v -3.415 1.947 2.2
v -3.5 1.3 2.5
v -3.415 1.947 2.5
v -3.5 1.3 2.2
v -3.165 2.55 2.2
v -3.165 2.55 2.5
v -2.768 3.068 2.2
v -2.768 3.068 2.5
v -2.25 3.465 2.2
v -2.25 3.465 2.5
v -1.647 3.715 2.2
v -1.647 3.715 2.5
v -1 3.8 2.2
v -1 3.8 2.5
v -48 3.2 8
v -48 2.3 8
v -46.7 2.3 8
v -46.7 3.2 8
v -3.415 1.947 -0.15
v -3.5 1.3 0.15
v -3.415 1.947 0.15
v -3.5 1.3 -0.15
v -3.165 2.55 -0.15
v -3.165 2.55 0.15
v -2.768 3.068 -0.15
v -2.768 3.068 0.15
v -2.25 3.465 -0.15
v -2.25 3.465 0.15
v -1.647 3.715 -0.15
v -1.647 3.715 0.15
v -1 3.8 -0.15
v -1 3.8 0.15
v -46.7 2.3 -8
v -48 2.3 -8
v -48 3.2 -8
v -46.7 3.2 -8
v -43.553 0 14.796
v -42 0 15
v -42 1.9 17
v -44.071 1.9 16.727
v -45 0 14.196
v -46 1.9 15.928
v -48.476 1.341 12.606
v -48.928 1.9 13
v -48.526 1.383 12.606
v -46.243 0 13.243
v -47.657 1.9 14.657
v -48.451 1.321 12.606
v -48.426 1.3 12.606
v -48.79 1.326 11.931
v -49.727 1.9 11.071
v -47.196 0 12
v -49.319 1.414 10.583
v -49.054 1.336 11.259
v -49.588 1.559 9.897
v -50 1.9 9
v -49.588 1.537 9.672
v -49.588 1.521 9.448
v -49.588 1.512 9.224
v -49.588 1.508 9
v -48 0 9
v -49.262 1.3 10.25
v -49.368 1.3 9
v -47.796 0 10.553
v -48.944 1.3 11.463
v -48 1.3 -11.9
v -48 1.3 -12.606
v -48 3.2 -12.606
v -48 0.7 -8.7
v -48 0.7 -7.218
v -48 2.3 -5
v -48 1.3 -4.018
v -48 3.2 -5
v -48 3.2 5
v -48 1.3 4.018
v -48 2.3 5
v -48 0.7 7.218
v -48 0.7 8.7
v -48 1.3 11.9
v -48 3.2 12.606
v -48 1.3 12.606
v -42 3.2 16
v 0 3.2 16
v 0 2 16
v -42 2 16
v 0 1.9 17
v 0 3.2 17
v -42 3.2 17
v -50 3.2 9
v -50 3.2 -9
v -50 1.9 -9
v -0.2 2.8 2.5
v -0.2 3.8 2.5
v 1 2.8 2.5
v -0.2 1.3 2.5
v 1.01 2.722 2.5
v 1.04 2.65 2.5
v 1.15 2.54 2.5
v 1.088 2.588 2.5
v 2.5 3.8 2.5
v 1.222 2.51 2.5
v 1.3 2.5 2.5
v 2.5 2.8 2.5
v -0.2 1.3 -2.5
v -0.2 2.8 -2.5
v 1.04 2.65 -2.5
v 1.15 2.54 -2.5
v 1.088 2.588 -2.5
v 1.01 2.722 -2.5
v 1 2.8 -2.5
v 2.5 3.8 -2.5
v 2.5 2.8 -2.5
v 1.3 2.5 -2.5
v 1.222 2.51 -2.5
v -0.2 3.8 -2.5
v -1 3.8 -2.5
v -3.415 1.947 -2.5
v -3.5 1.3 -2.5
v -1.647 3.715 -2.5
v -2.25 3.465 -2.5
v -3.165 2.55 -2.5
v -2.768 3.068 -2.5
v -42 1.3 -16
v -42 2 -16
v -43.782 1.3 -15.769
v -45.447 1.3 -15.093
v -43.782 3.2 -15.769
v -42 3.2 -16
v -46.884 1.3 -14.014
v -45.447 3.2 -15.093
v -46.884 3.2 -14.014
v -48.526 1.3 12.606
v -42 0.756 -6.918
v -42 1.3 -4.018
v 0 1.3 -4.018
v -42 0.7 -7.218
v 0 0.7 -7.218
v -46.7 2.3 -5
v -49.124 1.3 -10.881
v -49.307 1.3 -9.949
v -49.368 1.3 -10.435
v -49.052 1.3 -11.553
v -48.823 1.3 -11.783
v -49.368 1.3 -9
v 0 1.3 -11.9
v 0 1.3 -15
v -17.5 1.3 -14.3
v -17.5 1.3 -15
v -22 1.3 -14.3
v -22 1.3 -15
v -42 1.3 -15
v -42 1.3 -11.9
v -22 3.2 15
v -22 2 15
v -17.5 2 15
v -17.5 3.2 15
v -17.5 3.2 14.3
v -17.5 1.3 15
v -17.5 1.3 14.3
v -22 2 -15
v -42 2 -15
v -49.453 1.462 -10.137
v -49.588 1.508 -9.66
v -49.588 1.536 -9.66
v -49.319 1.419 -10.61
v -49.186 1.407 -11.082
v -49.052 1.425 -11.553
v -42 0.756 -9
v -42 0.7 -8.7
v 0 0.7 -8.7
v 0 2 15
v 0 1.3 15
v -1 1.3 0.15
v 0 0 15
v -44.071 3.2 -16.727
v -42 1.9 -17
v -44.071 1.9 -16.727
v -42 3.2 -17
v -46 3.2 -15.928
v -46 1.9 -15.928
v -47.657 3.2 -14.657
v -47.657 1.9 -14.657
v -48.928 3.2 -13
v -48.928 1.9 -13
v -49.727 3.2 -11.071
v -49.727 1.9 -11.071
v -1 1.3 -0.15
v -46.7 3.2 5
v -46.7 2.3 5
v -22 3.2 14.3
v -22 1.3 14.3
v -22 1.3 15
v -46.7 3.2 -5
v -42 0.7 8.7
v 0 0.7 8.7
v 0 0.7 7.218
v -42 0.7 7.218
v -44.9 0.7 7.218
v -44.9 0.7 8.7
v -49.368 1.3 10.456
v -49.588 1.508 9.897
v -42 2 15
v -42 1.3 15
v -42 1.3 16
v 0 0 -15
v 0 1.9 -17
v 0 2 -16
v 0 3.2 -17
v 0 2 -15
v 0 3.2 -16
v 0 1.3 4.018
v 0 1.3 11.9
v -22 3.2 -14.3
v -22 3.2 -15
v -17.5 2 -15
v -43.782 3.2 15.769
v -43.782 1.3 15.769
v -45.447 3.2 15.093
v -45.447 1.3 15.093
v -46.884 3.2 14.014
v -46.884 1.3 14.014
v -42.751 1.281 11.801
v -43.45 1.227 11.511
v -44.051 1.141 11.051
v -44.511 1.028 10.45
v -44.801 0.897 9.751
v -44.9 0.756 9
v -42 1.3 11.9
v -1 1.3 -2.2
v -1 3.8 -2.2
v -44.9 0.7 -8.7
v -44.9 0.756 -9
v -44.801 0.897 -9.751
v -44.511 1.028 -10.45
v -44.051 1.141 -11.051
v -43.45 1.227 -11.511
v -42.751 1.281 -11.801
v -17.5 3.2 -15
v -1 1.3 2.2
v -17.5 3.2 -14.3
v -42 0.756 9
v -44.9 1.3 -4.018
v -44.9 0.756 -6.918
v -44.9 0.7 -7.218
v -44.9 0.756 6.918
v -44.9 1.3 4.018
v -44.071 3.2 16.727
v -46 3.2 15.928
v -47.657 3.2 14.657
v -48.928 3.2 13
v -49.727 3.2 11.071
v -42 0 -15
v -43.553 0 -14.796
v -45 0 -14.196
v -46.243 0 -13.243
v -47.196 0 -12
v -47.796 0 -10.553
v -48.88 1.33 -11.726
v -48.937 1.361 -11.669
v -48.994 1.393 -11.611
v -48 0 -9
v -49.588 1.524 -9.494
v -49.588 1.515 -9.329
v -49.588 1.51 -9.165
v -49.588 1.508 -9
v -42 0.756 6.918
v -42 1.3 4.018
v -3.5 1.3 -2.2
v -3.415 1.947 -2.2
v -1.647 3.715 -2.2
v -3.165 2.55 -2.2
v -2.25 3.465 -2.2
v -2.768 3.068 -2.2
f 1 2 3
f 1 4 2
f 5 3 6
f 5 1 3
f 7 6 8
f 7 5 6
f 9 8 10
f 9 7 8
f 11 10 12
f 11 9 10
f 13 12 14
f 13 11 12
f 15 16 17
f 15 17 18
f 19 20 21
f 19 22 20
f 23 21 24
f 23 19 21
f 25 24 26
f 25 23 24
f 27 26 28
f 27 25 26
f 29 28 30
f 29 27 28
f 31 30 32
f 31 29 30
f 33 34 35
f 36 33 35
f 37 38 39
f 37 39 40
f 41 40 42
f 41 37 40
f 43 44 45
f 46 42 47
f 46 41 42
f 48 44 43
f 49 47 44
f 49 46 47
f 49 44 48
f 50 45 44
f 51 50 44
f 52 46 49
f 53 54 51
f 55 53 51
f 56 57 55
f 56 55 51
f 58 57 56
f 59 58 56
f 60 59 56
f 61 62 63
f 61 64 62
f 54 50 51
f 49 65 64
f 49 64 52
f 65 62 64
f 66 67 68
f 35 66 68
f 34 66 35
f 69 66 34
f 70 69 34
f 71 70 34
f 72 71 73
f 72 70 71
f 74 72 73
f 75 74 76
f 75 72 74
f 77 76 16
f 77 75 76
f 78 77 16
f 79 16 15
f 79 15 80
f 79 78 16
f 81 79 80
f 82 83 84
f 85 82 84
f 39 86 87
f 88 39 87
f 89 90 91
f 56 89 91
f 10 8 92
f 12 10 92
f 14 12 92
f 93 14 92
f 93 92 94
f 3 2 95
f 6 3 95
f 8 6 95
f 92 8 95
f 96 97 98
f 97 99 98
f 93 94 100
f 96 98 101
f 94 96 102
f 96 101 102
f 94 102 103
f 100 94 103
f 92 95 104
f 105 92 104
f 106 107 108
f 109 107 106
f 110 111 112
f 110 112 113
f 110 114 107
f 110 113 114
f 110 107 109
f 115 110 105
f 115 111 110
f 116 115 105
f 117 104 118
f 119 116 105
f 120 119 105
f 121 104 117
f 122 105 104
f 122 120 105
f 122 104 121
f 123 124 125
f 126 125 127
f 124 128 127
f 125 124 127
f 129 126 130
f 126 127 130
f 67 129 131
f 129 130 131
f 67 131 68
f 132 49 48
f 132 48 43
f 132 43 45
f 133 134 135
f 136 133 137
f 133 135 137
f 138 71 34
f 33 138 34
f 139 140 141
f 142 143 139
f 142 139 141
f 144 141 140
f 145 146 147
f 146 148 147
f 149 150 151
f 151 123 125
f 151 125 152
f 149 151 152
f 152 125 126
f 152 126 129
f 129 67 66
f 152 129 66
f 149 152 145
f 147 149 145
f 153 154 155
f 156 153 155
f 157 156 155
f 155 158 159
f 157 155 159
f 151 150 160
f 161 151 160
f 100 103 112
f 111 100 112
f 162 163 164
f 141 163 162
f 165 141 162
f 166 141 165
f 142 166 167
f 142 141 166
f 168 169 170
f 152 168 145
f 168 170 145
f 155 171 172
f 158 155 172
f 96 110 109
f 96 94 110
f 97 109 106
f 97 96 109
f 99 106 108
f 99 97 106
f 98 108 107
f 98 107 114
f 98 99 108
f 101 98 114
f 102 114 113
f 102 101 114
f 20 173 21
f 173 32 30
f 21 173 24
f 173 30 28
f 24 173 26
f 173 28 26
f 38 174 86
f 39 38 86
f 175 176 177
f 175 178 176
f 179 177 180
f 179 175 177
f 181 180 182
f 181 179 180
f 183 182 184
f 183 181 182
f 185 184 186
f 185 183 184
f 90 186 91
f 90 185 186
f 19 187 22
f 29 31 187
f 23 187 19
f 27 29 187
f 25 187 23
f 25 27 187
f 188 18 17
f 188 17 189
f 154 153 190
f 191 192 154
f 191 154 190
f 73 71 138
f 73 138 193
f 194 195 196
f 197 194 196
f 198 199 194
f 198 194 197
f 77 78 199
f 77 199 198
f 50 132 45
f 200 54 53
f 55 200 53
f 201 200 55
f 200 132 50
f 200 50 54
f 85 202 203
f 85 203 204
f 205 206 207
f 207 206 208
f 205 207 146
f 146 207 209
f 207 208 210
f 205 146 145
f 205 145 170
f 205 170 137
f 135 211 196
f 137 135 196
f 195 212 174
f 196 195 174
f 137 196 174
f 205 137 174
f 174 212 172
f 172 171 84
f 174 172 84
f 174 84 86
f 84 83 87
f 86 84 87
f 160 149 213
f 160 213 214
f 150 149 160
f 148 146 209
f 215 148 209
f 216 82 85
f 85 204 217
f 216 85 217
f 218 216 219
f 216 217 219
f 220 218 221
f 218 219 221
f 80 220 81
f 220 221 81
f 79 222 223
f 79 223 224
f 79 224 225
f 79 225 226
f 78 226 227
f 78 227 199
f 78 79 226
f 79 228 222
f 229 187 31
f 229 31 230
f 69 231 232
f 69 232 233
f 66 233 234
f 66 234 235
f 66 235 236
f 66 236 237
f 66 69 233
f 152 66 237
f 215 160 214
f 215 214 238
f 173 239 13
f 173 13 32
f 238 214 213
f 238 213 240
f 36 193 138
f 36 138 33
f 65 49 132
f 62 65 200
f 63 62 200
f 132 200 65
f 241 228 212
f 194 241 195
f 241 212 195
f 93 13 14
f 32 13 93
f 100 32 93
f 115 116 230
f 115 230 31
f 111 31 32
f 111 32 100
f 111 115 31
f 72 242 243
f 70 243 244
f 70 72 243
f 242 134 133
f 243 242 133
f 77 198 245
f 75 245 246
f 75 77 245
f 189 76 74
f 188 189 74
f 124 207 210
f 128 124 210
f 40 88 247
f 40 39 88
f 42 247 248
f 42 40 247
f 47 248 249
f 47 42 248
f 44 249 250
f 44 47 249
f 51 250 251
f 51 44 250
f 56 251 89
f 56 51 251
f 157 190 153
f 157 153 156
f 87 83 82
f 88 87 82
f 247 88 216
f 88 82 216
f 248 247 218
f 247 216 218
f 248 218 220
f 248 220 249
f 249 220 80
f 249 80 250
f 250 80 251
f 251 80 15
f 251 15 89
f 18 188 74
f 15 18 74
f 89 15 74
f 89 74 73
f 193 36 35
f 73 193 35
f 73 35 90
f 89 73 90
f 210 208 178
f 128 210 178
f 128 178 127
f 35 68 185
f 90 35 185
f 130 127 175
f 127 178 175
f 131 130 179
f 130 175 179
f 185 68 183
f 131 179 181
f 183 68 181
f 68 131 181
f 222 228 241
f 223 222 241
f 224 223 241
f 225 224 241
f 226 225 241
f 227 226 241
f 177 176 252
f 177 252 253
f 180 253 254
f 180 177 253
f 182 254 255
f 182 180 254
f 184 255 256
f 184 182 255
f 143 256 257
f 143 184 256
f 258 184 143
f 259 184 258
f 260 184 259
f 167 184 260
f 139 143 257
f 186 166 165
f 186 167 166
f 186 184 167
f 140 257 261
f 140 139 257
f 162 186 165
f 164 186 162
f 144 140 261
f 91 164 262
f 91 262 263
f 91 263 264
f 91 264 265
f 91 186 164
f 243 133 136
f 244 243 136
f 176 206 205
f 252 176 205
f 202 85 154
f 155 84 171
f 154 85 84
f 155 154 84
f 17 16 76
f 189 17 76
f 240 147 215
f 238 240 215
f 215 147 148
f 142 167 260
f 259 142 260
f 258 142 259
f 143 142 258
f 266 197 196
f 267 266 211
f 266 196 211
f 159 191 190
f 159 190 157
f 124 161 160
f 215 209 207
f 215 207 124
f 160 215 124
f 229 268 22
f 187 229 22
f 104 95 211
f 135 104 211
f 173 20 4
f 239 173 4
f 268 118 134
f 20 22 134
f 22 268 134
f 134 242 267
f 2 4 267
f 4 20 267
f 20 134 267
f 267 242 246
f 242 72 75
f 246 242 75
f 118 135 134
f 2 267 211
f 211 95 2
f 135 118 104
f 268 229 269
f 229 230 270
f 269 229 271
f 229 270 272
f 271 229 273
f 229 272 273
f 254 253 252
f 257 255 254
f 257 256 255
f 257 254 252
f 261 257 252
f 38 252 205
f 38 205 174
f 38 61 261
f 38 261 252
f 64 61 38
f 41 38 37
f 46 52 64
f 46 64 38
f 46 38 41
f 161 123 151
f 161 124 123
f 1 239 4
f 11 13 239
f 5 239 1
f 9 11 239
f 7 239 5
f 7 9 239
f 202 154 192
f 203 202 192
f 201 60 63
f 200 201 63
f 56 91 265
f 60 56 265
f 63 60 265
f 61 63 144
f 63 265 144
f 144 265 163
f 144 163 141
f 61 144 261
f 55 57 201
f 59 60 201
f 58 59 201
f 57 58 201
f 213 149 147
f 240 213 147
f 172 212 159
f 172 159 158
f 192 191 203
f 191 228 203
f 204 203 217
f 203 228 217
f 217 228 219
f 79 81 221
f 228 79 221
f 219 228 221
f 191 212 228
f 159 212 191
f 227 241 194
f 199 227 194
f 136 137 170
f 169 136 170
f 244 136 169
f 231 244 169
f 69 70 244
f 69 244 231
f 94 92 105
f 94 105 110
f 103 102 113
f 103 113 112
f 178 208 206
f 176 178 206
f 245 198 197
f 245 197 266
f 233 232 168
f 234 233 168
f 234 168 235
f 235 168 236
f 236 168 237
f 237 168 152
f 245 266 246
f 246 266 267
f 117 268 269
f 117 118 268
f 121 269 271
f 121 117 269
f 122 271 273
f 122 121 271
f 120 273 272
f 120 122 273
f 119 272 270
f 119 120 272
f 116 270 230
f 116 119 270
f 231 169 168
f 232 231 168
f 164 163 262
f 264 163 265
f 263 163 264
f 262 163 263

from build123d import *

# Parameters (mm, degrees)
BOSS_EXTRUDE1_DEPTH     = 42
SKETCH3_W               = 4.5
SKETCH3_H               = 0.7
BOSS_EXTRUDE2_DEPTH     = 1.899999
SKETCH6_W               = 2.500000024
SKETCH6_H               = 0.3
REVOLVE1_ANGLE          = 90
SKETCH7_W               = 2.7
SKETCH7_H               = 5
BOSS_EXTRUDE3_DEPTH     = 2.50000008
SKETCH9_W               = 3.499999976
SKETCH9_H               = 5
CUT_EXTRUDE1_DEPTH      = 1.50000008
SKETCH10_W              = 0.3
SKETCH10_H              = 5
REVOLVE2_ANGLE          = 90
BOSS_EXTRUDE5_START     = -5
BOSS_EXTRUDE5_DEPTH     = 5
REVOLVE4_ANGLE          = 90
REVOLVE6_ANGLE          = 90
BOSS_EXTRUDE7_DEPTH     = 18
BOSS_EXTRUDE8_DEPTH     = 2.9
CUT_EXTRUDE2_DEPTH      = 2.9
BOSS_EXTRUDE9_START     = -1.899999
BOSS_EXTRUDE9_DEPTH     = 1.899999
SKETCH29_W              = 3
SKETCH29_H              = 0.9
BOSS_EXTRUDE10_DEPTH    = 1.3
CUT_EXTRUDE3_START      = -3.1
CUT_EXTRUDE3_DEPTH      = 3.1
CUT_EXTRUDE4_START      = -44.9
CUT_EXTRUDE4_DEPTH      = 2.9
SKETCH34_W              = 0.799999976
SKETCH34_H              = 5
BOSS_EXTRUDE11_DEPTH    = 2.5
CUT_EXTRUDE5_DEPTH      = 53.947521022
CUT_EXTRUDE5_DEPTH_BACK = 12.7


with BuildPart() as part:
    # Sketch1 → Boss-Extrude1 (new body)
    with BuildSketch(Plane(origin=(0, 0, 0), x_dir=(0, 0, -1), z_dir=(1, 0, 0))):
        Polygon((-4.017828461, 1.2999976), (4.017828461, 1.2999976), (7.217828411, 0.69999753), (8.7, 0.69999753), (11.9, 1.2999976), (15, 1.2999976), (15, 1.9999962), (16, 1.9999962), (16, 3.1999962), (17, 3.1999962), (17, 1.8999962), (15, 0), (-15, 0), (-17, 1.8999962), (-17, 3.1999962), (-16, 3.1999962), (-16, 1.9999962), (-15, 1.9999962), (-15, 1.2999976), (-11.9, 1.2999976), (-8.7, 0.69999753), (-7.217828411, 0.69999753), align=None)
    extrude(amount=-BOSS_EXTRUDE1_DEPTH)

    # Sketch3 → Boss-Extrude2 (add)
    with BuildSketch(Plane(origin=(0, 1.2999976, 0), x_dir=(1, 0, 0), z_dir=(0, 1, 0))):
        with Locations((-19.75, 14.65)):
            Rectangle(SKETCH3_W, SKETCH3_H)
        with Locations((-19.75, -14.65)):
            Rectangle(SKETCH3_W, SKETCH3_H)
    extrude(amount=BOSS_EXTRUDE2_DEPTH)

    # Sketch6 → Revolve1 (revolve)
    with BuildSketch(Plane(origin=(0, 1.2999976, 0), x_dir=(1, 0, 0), z_dir=(0, 1, 0))):
        with Locations((-2.249999988, 2.35)):
            Rectangle(SKETCH6_W, SKETCH6_H)
        with Locations((-2.249999988, 0)):
            Rectangle(SKETCH6_W, SKETCH6_H)
        with Locations((-2.249999988, -2.35)):
            Rectangle(SKETCH6_W, SKETCH6_H)
    revolve(axis=Axis((-0.999999976, 1.2999976, -2.5), (0, 0, -1)), revolution_arc=REVOLVE1_ANGLE)

    # Sketch20 → Revolve4 (revolve)
    with BuildSketch(Plane.ZY.offset(42)):
        Polygon((17, 3.1999962), (17, 1.8999962), (15, 0), (9, 0), (9, 0.756247537), (11.9, 0.756247537), (11.9, 1.2999976), (15, 1.2999976), (16, 1.2999976), (16, 1.9999962), (16, 3.1999962), align=None)
    revolve(axis=Axis((-42, 0, 9), (0, -1, 0)), revolution_arc=REVOLVE4_ANGLE)

    # Sketch22 → Revolve6 (revolve)
    with BuildSketch(Plane.ZY.offset(42)):
        Polygon((-9, 0.756247537), (-9, 0), (-15, 0), (-17, 1.8999962), (-17, 3.1999962), (-16, 3.1999962), (-16, 1.9999962), (-16, 1.2999976), (-15, 1.2999976), (-11.9, 1.2999976), (-11.9, 0.756247537), align=None)
    revolve(axis=Axis((-42, 3.1999962, -9), (0, 1, 0)), revolution_arc=REVOLVE6_ANGLE)

    # Sketch25 → Boss-Extrude7 (add)
    with BuildSketch(Plane.XY.offset(-9)):
        Polygon((-42, 0), (-42, 0.756247537), (-44.9, 0.756247537), (-44.9, 1.2999976), (-49, 1.2999976), (-49, 3.1999962), (-50, 3.1999962), (-50, 1.8999962), (-48, 0), align=None)
    extrude(amount=BOSS_EXTRUDE7_DEPTH)

    # Sketch26 → Boss-Extrude8 (add)
    with BuildSketch(Plane.ZY.offset(42)):
        Polygon((11.9, 0.756247537), (11.9, 1.2999976), (9, 0.756247537), align=None)
        Polygon((6.917828416, 0.756247537), (4.017828461, 1.2999976), (-4.017828461, 1.2999976), (-7.067828413, 0.728122533), align=None)
        Polygon((-9, 0.756247537), (-11.9, 1.2999976), (-11.9, 0.756247537), align=None)
    extrude(amount=BOSS_EXTRUDE8_DEPTH)

    # Sketch27 → Cut-Extrude2 (cut)
    with BuildSketch(Plane(origin=(-42, 0, 0), x_dir=(0, 0, -1), z_dir=(1, 0, 0))):
        Polygon((-8.7, 0.69999753), (-7.217828411, 0.69999753), (-6.917828416, 0.756247537), (-9, 0.756247537), align=None)
        Polygon((8.7, 0.69999753), (9, 0.756247537), (6.917828416, 0.756247537), (7.217828416, 0.69999753), align=None)
    extrude(amount=-CUT_EXTRUDE2_DEPTH, mode=Mode.SUBTRACT)

    # Sketch28 → Boss-Extrude9 (add)
    with BuildSketch(Plane(origin=(0, 3.1999962, 0), x_dir=(1, 0, 0), z_dir=(0, 1, 0)).offset(BOSS_EXTRUDE9_START)):
        Polygon((-48, 12.605551275), (-48, -12.605551275), (-48.526031835, -12.605551275), (-49.587841203, -9.896604303), (-49.587841203, 5.333499325), (-49.587841203, 9.659559889), (-49.052063671, 11.553487605), align=None)
    extrude(amount=BOSS_EXTRUDE9_DEPTH)

    # Sketch29 → Boss-Extrude10 (add)
    with BuildSketch(Plane(origin=(-48, 0, 0), x_dir=(0, 0, -1), z_dir=(1, 0, 0))):
        with Locations((6.5, 2.7499962)):
            Rectangle(SKETCH29_W, SKETCH29_H)
        with Locations((-6.5, 2.7499962)):
            Rectangle(SKETCH29_W, SKETCH29_H)
    extrude(amount=BOSS_EXTRUDE10_DEPTH)

    # Sketch31 → Cut-Extrude3 (cut)
    with BuildSketch(Plane(origin=(-44.9, 0, 0), x_dir=(0, 0, -1), z_dir=(1, 0, 0)).offset(CUT_EXTRUDE3_START)):
        Polygon((-8.7, 0.69999753), (-7.217828411, 0.69999753), (-4.017828461, 1.2999976), (-9, 1.2999976), (-11.9, 1.2999976), align=None)
        Polygon((4.017828461, 1.2999976), (7.217828416, 0.69999753), (8.7, 0.69999753), (11.9, 1.2999976), align=None)
    extrude(amount=CUT_EXTRUDE3_DEPTH, mode=Mode.SUBTRACT)

    # Sketch33 → Cut-Extrude4 (cut)
    with BuildSketch(Plane(origin=(0, 0, 0), x_dir=(0, 0, -1), z_dir=(1, 0, 0)).offset(CUT_EXTRUDE4_START)):
        Polygon((-11.9, 1.2999976), (-4.017828461, 1.2999976), (-7.217828411, 0.69999753), (-8.7, 0.69999753), align=None)
        Polygon((4.017828461, 1.2999976), (11.9, 1.2999976), (8.7, 0.69999753), (7.272372627, 0.69999753), align=None)
    extrude(amount=CUT_EXTRUDE4_DEPTH, mode=Mode.SUBTRACT)



with BuildPart() as body_2:
    # Sketch7 → Boss-Extrude3 (new body)
    with BuildSketch(Plane(origin=(1.692653476, 1.2999976, 1.325896357), x_dir=(1, 0, 0), z_dir=(0, 1, 0))):
        with Locations((-0.542653476, 1.325896357)):
            Rectangle(SKETCH7_W, SKETCH7_H)
    extrude(amount=BOSS_EXTRUDE3_DEPTH)

    # Sketch9 → Cut-Extrude1 (cut)
    with BuildSketch(Plane.XZ.offset(-1.2999976)):
        with Locations((0.750000012, 0)):
            Rectangle(SKETCH9_W, SKETCH9_H)
    extrude(amount=-CUT_EXTRUDE1_DEPTH, mode=Mode.SUBTRACT)

    # Sketch10 → Revolve2 (revolve)
    with BuildSketch(Plane.XZ.offset(-2.79999768)):
        with Locations((1.15, 0)):
            Rectangle(SKETCH10_W, SKETCH10_H)
    revolve(axis=Axis((1.3, 2.79999768, 2.5), (0, 0, 1)), revolution_arc=REVOLVE2_ANGLE)

    # Sketch11 → Boss-Extrude5 (add)
    with BuildSketch(Plane(origin=(0, 0, -2.5), x_dir=(-1, 0, 0), z_dir=(0, 0, -1)).offset(BOSS_EXTRUDE5_START)):
        Polygon((-1.3, 2.49999768), (-2.5, 2.79999768), (-1.3, 2.79999768), align=None)
    extrude(amount=BOSS_EXTRUDE5_DEPTH)


with BuildPart() as part_1:
    add(part.part)

    add(body_2.part)  # Boss-Extrude11 merges body 2
    # Sketch34 → Boss-Extrude11 (add)
    with BuildSketch(Plane(origin=(0, 1.2999976, 0), x_dir=(1, 0, 0), z_dir=(0, 1, 0))):
        with Locations((-0.599999988, 0)):
            Rectangle(SKETCH34_W, SKETCH34_H)
    extrude(amount=BOSS_EXTRUDE11_DEPTH)

    # Sketch36 → Cut-Extrude5 (cut, two sides: drawn at the far end of the back side and taken through both)
    with BuildSketch(Plane.XY.offset(-CUT_EXTRUDE5_DEPTH_BACK)):
        Polygon((-50, 1.8999962), (-48, 0), (-50, 0), align=None)
    extrude(amount=CUT_EXTRUDE5_DEPTH + CUT_EXTRUDE5_DEPTH_BACK, mode=Mode.SUBTRACT)


solid = part_1.part
